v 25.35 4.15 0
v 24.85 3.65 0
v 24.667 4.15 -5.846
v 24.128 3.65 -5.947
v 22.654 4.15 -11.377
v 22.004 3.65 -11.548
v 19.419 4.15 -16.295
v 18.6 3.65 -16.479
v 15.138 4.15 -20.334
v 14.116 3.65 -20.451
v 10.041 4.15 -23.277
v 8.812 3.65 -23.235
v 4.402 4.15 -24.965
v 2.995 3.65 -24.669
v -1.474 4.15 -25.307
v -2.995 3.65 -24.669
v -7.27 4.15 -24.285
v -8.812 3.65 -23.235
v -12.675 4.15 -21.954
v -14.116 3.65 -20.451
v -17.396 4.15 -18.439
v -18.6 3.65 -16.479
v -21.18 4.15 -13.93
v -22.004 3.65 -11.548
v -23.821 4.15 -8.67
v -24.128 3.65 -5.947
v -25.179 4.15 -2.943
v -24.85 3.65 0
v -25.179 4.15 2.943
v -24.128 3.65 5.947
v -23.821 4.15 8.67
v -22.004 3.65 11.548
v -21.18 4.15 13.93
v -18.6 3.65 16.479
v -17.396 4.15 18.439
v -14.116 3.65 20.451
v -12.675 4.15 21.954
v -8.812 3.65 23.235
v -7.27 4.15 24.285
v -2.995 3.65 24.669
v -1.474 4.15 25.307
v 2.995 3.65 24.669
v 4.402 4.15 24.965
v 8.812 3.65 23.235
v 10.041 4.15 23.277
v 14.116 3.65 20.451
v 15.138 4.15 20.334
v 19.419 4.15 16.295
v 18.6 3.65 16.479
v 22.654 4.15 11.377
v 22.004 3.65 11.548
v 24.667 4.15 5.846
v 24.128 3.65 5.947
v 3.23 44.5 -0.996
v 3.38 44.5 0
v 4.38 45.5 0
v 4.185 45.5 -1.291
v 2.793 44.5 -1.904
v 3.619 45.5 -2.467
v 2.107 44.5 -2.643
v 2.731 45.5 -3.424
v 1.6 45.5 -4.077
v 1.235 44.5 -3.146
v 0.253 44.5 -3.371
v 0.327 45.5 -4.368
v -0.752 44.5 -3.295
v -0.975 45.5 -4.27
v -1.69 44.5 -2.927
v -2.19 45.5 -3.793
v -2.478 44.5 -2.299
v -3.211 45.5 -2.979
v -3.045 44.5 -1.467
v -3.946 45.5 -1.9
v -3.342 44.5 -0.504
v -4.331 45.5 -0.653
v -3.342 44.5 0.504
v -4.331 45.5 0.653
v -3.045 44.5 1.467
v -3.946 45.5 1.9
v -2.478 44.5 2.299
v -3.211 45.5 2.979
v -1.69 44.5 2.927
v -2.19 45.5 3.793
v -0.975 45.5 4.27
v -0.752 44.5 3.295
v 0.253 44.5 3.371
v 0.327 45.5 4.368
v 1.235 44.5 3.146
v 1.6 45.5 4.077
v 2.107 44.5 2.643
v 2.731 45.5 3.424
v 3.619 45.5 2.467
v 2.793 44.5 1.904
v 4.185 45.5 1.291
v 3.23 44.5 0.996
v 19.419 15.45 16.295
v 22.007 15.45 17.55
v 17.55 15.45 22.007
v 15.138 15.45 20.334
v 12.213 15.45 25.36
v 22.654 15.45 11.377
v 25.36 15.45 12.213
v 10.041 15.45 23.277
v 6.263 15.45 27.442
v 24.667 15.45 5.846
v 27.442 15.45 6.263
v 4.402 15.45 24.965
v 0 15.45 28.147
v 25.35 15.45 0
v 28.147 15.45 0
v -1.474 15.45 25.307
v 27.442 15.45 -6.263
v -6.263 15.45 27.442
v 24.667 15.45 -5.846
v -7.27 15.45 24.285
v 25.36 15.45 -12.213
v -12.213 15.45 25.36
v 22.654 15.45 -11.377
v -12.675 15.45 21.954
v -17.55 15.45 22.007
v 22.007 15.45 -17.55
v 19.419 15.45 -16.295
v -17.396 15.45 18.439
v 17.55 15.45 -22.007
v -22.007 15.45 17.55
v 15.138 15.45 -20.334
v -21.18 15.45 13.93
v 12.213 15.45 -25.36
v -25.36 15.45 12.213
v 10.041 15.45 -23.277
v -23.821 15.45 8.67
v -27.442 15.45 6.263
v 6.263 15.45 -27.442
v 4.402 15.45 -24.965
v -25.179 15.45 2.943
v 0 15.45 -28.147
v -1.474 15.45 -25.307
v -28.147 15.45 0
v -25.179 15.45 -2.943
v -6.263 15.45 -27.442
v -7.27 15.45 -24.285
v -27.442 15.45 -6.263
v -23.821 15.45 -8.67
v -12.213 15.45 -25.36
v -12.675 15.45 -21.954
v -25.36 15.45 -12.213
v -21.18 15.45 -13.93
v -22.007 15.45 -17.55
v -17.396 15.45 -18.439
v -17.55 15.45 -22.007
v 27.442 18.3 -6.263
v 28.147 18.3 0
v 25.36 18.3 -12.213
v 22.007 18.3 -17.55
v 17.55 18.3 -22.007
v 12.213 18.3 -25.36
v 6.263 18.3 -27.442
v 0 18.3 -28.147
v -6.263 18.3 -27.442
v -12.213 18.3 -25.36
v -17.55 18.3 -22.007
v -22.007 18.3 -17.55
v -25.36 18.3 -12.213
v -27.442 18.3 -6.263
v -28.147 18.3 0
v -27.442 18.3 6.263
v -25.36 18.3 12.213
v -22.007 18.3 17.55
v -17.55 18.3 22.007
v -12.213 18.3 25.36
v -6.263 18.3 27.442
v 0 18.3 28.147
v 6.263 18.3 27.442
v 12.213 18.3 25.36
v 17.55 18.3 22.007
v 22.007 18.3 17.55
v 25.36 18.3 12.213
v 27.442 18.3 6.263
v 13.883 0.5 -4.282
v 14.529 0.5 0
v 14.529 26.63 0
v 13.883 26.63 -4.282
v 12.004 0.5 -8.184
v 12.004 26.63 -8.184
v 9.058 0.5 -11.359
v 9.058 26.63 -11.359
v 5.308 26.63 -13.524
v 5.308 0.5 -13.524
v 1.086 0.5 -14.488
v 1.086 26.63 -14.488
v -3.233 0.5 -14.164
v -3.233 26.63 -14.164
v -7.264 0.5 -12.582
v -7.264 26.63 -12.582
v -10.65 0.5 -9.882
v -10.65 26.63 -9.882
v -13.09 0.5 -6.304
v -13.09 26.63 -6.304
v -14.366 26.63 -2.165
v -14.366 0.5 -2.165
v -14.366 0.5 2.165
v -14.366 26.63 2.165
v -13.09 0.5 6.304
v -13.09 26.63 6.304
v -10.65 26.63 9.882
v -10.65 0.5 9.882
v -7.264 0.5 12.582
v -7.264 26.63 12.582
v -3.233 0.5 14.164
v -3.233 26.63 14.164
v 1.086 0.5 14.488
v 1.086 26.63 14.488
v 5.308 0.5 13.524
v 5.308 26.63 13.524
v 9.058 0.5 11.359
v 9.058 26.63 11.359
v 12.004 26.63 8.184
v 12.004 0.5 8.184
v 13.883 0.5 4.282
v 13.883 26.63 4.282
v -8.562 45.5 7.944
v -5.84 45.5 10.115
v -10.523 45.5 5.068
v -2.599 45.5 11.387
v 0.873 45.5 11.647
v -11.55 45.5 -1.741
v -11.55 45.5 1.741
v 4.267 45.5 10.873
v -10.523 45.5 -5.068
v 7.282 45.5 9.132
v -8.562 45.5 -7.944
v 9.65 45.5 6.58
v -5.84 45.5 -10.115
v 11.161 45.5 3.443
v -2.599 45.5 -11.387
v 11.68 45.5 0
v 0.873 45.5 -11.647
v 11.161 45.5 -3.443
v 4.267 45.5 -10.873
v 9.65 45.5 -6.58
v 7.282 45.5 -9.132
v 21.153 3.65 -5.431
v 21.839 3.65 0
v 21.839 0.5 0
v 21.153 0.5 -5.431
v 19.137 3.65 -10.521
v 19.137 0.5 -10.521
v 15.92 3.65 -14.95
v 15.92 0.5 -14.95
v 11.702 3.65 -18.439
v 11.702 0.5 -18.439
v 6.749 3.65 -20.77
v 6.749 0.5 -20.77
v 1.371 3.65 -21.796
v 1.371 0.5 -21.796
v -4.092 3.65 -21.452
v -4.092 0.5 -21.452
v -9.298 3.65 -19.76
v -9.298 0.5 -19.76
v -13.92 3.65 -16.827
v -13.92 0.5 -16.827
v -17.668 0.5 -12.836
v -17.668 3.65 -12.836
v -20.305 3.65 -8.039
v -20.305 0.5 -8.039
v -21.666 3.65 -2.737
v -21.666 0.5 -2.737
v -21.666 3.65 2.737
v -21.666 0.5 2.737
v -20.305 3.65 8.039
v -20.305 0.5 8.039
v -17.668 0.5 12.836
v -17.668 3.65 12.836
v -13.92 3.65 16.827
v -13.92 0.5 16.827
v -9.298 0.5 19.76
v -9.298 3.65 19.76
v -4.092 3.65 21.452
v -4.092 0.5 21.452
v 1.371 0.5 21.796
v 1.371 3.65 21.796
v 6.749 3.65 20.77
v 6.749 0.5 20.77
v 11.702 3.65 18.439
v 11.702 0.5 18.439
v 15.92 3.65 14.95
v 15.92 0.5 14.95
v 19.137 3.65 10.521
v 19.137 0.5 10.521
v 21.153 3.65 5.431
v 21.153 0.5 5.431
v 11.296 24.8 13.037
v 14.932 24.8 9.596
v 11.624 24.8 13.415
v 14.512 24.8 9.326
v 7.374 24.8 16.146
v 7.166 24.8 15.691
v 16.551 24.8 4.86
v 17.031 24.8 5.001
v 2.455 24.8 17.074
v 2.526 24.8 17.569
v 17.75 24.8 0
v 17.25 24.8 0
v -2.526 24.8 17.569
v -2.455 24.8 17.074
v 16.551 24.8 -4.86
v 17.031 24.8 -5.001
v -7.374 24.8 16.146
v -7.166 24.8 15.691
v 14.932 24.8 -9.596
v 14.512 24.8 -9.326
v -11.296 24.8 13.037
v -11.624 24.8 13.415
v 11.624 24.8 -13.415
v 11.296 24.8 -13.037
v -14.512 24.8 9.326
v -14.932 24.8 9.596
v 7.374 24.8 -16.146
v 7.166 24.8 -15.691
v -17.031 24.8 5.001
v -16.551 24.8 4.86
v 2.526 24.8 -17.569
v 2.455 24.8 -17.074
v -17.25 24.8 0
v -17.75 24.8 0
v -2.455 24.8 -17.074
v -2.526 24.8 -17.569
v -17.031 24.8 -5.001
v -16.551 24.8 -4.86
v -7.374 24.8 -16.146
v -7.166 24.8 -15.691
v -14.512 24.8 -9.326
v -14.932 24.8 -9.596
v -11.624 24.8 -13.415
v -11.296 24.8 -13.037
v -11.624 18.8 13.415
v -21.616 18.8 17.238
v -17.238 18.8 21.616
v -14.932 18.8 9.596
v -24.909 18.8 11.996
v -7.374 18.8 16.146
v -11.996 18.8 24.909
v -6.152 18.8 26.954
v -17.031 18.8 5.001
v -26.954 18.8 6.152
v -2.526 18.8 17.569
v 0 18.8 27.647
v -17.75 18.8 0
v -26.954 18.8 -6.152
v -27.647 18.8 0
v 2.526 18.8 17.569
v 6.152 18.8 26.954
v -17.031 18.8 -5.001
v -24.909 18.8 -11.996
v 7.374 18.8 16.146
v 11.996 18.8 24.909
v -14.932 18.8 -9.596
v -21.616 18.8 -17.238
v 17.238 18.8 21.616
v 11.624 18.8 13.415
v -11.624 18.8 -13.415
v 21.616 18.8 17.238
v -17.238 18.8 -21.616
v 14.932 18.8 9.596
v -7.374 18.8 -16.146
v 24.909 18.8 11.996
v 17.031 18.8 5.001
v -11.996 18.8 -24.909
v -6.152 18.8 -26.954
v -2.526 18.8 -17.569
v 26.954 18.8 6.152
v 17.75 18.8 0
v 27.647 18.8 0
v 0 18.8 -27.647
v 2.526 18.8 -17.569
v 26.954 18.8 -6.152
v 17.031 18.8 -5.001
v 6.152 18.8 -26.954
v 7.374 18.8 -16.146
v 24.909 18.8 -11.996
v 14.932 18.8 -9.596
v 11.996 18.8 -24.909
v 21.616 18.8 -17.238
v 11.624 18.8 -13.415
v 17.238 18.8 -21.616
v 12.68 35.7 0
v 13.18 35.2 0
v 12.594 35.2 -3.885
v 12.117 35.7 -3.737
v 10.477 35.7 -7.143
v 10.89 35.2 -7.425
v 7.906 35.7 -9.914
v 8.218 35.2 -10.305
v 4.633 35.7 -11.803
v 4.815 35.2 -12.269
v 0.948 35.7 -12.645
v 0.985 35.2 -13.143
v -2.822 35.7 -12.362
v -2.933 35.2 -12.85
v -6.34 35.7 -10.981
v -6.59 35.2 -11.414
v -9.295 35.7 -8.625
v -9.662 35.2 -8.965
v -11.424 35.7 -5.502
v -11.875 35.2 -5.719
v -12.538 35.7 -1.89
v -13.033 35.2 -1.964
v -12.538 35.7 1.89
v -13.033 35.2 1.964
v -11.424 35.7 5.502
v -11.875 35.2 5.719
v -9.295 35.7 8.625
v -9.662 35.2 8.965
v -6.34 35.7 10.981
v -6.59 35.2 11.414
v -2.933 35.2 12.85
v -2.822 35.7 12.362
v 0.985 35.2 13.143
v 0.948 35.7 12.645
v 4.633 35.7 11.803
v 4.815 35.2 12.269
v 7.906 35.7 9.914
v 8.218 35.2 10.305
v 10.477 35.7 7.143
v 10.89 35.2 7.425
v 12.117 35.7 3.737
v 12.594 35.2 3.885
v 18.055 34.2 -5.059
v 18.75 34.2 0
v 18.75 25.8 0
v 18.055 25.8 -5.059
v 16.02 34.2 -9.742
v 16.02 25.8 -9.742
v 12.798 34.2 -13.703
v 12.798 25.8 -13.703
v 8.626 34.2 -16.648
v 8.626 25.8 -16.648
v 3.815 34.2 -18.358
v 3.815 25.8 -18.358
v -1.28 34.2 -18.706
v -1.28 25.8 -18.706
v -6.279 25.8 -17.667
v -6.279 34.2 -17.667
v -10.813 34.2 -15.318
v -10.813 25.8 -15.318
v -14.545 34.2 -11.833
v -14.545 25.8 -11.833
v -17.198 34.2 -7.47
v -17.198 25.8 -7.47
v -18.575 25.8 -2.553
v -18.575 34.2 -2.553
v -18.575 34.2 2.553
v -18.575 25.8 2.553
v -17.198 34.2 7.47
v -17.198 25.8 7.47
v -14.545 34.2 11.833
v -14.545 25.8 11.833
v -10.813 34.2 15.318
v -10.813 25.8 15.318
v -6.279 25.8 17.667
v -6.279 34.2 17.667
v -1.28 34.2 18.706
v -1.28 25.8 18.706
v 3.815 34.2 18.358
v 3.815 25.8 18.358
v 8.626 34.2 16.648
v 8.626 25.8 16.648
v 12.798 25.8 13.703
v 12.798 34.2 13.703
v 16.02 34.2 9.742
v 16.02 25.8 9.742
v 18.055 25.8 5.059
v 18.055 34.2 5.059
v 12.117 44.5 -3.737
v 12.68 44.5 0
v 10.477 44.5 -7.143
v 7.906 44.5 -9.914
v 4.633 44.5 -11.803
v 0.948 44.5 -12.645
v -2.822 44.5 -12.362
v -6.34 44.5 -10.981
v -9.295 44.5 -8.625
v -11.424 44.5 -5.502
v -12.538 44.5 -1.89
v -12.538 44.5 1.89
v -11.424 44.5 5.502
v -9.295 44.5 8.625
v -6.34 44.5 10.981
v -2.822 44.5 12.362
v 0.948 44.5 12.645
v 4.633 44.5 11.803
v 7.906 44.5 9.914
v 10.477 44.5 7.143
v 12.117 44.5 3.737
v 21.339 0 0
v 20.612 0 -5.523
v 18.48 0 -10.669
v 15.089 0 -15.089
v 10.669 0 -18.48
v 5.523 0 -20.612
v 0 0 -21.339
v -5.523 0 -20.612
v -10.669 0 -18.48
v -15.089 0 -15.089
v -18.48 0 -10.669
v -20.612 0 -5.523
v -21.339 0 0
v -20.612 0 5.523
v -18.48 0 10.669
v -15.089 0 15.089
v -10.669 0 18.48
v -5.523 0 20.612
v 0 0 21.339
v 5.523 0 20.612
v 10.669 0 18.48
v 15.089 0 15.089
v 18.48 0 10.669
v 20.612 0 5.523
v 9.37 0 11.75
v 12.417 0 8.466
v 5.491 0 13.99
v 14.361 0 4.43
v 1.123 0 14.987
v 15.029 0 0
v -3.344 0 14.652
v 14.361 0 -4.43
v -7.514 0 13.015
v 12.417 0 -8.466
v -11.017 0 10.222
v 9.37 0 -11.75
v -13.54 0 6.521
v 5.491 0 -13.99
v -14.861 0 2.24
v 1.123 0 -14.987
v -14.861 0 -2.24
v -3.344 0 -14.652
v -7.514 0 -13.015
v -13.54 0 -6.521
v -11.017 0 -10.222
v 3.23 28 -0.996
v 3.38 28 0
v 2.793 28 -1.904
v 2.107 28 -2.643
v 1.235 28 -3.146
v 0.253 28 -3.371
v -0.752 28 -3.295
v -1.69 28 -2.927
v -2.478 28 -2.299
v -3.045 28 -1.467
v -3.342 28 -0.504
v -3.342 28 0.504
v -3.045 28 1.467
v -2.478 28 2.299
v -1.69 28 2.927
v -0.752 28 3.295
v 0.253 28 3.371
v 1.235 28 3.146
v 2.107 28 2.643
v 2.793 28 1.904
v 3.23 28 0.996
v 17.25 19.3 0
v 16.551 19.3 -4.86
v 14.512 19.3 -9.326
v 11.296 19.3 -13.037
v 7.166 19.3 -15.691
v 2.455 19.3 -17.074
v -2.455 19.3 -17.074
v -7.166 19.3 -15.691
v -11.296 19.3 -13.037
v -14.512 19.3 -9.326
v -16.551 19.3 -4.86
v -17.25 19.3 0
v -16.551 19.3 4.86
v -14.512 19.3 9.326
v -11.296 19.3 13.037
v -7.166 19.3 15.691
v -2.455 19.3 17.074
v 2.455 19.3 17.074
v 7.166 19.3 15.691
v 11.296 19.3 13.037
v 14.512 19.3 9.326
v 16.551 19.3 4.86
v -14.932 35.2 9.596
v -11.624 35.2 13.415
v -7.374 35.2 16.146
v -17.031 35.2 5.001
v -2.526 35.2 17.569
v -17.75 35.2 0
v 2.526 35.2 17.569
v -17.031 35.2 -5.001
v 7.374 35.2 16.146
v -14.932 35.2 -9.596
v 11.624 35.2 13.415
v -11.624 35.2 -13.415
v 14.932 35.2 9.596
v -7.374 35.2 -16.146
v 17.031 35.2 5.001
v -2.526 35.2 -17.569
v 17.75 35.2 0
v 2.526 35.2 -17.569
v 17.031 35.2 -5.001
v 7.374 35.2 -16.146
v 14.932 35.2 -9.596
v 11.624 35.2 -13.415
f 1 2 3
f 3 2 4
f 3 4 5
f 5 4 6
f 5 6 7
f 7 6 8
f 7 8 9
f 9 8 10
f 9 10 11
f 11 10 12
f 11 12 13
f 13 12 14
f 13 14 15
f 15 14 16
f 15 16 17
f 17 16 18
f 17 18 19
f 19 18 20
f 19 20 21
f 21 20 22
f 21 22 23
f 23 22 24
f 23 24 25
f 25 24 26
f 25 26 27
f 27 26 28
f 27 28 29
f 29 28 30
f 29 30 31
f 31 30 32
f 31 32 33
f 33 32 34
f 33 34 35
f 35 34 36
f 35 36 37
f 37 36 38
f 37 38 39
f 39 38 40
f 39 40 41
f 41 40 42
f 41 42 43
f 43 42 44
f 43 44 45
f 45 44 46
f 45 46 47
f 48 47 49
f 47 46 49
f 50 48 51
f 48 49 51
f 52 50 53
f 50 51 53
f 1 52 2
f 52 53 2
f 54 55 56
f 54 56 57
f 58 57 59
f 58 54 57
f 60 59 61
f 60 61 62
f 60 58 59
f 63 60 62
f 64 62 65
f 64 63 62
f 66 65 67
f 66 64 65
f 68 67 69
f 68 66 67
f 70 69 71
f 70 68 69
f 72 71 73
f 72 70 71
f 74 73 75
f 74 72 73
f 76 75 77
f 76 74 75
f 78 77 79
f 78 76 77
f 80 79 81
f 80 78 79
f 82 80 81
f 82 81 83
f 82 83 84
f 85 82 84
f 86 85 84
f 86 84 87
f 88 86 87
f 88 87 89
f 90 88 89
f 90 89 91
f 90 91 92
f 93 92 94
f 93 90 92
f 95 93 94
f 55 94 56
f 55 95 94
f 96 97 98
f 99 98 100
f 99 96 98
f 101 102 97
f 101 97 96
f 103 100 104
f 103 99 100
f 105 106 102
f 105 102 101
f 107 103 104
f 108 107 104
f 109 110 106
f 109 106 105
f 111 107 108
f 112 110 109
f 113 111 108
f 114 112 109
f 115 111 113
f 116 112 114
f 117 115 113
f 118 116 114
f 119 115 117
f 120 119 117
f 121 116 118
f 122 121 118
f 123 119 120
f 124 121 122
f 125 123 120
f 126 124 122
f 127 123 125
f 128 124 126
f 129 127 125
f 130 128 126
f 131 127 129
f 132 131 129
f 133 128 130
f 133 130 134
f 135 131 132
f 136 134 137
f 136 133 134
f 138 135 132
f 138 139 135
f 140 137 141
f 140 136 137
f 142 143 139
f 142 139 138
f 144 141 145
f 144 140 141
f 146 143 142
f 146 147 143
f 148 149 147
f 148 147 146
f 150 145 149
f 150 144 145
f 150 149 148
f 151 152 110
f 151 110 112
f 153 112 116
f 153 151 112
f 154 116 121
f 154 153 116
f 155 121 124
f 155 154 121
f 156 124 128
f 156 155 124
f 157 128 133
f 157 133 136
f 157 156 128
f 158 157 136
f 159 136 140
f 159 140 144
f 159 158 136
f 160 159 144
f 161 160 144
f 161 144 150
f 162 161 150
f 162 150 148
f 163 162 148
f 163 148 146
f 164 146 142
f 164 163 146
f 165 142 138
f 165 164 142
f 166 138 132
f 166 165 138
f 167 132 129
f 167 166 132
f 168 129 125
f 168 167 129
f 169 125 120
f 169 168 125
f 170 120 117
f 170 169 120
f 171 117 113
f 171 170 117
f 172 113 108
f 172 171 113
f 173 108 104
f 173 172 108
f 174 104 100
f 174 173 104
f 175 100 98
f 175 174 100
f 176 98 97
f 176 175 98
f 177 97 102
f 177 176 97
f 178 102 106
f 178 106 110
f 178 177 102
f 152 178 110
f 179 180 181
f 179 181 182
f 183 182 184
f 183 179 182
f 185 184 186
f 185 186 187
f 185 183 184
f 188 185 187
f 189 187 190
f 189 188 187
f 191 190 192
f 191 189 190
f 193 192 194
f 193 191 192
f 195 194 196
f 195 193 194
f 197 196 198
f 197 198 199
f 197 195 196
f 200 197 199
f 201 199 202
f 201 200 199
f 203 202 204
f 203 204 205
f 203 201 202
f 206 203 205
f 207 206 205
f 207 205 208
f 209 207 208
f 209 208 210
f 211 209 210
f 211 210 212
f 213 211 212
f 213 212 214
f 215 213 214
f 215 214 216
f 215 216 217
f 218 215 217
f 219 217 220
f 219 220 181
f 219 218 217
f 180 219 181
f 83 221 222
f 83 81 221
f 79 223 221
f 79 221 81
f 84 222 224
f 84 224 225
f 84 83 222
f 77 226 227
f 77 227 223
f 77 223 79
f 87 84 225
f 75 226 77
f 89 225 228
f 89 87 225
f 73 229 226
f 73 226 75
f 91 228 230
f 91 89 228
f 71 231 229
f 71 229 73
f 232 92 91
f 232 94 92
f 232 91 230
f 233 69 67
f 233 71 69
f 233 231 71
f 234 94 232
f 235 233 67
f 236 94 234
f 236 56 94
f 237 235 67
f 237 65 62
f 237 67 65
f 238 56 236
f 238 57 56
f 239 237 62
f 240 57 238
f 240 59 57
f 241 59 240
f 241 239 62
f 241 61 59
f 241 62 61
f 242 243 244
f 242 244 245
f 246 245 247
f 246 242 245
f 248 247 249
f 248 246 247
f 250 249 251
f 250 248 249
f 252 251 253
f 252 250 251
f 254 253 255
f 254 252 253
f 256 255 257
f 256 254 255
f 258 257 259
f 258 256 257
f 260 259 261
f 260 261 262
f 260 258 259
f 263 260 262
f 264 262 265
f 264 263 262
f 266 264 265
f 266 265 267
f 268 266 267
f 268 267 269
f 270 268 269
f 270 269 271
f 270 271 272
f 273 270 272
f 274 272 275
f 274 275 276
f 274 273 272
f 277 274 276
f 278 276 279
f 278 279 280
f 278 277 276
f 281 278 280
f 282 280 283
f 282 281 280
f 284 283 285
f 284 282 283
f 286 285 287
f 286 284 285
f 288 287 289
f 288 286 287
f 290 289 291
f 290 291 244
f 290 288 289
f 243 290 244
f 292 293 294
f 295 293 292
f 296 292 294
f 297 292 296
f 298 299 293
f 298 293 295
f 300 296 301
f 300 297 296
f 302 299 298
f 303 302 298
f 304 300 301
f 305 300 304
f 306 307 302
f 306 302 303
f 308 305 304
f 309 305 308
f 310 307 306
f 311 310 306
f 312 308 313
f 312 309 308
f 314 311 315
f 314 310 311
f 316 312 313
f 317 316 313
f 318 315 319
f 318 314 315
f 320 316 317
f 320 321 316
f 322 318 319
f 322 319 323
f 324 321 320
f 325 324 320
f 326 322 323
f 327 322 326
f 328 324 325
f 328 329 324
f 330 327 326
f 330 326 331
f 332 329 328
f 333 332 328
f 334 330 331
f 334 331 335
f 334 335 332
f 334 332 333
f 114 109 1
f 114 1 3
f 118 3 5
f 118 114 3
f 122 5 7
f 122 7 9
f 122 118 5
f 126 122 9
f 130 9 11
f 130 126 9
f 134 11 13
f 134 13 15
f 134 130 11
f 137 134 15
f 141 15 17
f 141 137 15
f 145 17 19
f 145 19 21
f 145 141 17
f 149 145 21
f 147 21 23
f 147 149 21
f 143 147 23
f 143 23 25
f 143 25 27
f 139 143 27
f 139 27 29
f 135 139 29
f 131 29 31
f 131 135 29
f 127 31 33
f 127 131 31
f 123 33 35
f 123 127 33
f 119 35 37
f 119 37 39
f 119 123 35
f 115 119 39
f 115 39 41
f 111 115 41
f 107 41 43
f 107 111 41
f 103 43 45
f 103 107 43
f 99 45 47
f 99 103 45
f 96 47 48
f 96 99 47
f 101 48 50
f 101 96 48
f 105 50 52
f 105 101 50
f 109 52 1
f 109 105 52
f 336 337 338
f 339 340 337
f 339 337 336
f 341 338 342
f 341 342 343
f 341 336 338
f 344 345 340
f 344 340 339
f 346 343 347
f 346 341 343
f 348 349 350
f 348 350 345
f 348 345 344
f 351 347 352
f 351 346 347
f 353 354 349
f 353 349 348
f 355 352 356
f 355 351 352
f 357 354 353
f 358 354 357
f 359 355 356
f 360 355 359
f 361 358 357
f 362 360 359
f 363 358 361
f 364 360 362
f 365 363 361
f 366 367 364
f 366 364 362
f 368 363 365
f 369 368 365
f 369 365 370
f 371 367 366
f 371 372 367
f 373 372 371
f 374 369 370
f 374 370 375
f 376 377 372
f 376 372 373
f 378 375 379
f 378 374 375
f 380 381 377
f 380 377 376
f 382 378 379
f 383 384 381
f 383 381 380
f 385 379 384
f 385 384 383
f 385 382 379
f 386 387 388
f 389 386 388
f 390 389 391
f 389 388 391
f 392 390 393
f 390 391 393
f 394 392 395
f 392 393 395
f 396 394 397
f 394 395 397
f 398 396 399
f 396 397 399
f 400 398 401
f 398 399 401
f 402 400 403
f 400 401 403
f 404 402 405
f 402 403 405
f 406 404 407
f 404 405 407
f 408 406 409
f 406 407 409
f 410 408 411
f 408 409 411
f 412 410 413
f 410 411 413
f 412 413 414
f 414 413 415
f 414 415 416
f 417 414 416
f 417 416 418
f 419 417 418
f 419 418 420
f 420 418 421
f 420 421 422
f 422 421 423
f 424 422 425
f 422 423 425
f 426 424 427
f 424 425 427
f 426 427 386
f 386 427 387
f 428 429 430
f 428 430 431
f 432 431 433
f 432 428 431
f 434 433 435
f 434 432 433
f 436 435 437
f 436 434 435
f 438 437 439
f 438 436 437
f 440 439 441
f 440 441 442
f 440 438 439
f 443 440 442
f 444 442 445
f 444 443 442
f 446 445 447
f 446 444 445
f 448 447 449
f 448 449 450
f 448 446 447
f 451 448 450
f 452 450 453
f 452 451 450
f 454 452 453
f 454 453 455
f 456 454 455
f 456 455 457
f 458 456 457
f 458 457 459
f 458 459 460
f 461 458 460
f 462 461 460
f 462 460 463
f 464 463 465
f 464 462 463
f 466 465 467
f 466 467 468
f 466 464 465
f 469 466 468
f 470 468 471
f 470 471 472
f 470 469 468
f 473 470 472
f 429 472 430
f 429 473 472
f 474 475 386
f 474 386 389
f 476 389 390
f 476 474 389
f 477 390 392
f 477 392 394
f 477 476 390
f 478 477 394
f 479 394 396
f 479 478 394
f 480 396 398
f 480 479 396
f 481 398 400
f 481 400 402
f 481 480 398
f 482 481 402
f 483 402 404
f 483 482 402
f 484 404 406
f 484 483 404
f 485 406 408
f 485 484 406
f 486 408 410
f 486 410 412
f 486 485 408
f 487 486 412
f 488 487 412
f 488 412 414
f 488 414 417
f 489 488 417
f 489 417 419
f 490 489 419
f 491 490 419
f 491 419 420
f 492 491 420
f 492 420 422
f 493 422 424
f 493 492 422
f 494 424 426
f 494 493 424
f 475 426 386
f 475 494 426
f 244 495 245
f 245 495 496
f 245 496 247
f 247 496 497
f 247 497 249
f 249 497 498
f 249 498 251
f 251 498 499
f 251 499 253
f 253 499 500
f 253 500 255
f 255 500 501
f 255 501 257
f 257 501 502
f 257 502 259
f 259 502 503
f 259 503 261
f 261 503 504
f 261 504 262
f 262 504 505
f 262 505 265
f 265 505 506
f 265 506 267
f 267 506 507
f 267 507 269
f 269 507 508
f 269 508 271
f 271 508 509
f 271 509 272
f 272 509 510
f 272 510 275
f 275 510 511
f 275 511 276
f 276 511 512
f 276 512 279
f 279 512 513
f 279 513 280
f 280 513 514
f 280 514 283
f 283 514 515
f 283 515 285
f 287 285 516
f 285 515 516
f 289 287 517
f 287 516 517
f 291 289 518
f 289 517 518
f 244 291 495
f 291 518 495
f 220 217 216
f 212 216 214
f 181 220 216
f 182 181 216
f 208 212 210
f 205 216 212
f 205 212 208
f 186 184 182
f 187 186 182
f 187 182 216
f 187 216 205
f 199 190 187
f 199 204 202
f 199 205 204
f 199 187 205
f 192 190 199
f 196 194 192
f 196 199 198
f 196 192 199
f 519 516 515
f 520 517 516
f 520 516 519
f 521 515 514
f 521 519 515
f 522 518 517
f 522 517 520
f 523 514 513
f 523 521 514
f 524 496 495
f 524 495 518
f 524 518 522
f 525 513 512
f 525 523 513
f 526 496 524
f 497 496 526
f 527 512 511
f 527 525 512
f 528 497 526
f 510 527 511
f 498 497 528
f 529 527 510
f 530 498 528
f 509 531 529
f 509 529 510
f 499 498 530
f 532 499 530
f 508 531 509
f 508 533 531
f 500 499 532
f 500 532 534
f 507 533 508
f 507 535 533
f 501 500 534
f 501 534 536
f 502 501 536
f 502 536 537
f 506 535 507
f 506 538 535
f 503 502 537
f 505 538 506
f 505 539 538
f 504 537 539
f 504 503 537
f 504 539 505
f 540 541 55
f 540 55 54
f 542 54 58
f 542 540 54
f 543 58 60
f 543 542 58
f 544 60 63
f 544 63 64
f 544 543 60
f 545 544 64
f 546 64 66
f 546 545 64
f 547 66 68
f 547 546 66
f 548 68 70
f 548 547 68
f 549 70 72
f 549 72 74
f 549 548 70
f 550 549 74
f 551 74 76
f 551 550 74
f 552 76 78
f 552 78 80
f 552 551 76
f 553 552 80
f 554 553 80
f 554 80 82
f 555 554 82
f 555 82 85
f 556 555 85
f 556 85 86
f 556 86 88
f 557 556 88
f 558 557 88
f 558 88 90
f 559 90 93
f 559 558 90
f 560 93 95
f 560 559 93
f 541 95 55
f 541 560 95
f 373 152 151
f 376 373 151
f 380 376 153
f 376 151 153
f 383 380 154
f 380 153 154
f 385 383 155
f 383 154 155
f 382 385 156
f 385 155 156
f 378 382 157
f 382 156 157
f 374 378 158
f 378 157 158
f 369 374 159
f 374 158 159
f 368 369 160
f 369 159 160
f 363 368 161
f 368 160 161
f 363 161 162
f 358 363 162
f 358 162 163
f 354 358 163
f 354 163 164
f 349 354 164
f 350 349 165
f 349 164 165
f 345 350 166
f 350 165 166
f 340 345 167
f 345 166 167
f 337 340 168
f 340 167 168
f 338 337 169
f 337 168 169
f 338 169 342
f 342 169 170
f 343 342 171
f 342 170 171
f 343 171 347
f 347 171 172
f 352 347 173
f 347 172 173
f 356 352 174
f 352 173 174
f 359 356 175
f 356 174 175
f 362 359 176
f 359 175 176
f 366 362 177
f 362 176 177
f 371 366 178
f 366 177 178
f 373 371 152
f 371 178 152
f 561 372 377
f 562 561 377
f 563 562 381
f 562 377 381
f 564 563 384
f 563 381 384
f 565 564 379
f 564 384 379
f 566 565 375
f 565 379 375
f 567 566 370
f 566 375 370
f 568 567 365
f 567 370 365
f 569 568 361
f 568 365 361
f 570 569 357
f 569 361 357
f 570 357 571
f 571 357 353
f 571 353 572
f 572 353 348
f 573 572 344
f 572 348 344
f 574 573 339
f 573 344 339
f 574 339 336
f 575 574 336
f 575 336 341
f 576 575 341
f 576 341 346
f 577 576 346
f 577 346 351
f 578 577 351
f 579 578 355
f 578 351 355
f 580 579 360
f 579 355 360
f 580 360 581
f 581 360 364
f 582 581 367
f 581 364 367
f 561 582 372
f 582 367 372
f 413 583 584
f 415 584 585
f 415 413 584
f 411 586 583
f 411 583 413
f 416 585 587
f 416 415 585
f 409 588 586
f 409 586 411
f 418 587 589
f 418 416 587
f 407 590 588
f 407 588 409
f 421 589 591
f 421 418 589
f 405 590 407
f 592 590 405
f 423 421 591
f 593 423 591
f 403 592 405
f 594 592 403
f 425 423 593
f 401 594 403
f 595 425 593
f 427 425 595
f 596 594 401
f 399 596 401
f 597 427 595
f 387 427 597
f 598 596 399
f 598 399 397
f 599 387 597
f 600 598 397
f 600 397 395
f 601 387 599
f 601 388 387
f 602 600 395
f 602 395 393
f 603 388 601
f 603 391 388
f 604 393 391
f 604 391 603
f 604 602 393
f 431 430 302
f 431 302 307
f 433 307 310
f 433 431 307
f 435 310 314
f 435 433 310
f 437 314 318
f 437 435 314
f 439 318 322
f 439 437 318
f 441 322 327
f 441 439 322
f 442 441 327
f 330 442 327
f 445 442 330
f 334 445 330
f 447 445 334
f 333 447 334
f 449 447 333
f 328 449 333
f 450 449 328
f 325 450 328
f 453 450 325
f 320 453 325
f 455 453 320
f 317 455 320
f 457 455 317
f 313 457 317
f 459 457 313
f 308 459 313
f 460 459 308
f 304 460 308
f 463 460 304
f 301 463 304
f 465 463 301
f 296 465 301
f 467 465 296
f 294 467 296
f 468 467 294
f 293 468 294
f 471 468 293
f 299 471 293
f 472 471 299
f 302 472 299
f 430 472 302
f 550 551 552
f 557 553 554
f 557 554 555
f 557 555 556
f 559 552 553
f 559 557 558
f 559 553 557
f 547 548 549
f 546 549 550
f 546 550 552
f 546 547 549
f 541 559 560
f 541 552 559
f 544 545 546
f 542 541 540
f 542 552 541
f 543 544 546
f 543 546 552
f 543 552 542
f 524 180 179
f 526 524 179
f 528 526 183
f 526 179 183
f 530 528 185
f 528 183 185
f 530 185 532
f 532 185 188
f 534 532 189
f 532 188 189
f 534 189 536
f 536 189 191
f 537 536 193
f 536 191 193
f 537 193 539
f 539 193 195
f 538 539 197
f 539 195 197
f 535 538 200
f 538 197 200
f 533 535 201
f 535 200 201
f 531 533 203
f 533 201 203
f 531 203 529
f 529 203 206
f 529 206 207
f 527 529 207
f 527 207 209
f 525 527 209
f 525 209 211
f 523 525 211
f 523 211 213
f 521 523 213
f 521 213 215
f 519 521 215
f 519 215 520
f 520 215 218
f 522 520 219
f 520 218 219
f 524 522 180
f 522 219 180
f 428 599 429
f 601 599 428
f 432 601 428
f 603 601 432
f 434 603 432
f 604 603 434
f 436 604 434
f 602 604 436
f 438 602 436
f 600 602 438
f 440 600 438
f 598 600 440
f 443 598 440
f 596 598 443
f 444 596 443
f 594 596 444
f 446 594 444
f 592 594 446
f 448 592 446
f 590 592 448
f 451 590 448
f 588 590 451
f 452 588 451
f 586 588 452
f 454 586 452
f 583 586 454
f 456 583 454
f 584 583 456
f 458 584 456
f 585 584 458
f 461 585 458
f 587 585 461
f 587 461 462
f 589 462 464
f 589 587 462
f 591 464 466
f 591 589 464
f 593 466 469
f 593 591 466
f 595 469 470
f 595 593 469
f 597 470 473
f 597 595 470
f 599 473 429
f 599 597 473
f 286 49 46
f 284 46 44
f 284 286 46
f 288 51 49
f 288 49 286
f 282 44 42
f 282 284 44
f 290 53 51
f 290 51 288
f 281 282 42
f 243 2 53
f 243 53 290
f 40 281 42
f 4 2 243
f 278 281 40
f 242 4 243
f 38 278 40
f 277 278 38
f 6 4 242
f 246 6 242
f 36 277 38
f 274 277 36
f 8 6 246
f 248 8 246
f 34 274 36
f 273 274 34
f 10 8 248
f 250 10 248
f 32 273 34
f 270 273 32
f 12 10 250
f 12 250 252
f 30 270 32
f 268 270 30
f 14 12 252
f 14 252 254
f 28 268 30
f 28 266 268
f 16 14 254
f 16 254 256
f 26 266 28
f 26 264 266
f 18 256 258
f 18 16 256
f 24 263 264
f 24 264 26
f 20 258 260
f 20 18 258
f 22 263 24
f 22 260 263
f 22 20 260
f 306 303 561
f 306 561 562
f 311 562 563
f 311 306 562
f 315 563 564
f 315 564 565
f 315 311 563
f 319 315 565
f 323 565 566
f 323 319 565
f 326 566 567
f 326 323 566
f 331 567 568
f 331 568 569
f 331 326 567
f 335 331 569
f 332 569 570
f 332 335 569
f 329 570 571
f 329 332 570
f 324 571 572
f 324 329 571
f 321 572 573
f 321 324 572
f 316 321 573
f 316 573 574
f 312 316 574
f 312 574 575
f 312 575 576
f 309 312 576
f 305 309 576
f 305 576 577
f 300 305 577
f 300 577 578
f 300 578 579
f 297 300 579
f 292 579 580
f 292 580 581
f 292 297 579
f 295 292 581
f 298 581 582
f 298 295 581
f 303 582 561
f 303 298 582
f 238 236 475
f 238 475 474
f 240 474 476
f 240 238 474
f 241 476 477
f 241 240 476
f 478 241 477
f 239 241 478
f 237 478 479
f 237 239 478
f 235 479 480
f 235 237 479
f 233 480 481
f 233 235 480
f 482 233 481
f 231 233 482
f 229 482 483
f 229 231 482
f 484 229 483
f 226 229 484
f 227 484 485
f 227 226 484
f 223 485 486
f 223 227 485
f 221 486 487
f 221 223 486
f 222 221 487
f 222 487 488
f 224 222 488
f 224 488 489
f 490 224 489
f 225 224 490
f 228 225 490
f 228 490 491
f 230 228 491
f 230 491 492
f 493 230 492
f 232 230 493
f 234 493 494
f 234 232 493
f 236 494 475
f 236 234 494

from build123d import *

# Parameters (mm, degrees)
CHAMFER2_SIZE = 1
CHAMFER3_SIZE = 1
CHAMFER4_SIZE = 0.5


with BuildPart() as part:
    # Sketch1 → Revolve1 (revolve)
    with BuildSketch(Plane.XY):
        Polygon((0, 28), (0, 26.629648104), (14.528640902, 26.629648104), (14.528640902, 0), (21.838640902, 0), (21.838640902, 3.65), (25.35, 3.65), (25.35, 15.45), (28.147407407, 15.45), (28.147407407, 18.8), (17.25, 18.8), (17.25, 24.8), (18.75, 24.8), (18.75, 35.2), (12.68, 35.2), (12.68, 45.5), (3.38, 45.5), (3.38, 28), align=None)
    revolve(axis=Axis((0, 0, 0), (0, 1, 0)))

    # Chamfer2
    chamfer2_edges = [part.edges().sort_by_distance(p)[0] for p in [
        (-3.38, 45.5, 0),
        (-18.75, 35.2, 0),
        (-18.75, 24.8, 0),
    ]]
    chamfer(chamfer2_edges, length=CHAMFER2_SIZE)

    # Chamfer3
    chamfer3_edges = [part.edges().sort_by_distance(p)[0] for p in [
        (-12.68, 45.5, 0),
    ]]
    chamfer(chamfer3_edges, length=CHAMFER3_SIZE)

    # Chamfer4
    chamfer4_edges = [part.edges().sort_by_distance(p)[0] for p in [
        (-12.68, 35.2, 0),
        (-17.25, 18.8, 0),
        (-28.147407407, 18.8, 0),
        (-25.35, 3.65, 0),
        (-21.838640902, 0, 0),
        (-14.528640902, 0, 0),
    ]]
    chamfer(chamfer4_edges, length=CHAMFER4_SIZE)


solid = part.part
